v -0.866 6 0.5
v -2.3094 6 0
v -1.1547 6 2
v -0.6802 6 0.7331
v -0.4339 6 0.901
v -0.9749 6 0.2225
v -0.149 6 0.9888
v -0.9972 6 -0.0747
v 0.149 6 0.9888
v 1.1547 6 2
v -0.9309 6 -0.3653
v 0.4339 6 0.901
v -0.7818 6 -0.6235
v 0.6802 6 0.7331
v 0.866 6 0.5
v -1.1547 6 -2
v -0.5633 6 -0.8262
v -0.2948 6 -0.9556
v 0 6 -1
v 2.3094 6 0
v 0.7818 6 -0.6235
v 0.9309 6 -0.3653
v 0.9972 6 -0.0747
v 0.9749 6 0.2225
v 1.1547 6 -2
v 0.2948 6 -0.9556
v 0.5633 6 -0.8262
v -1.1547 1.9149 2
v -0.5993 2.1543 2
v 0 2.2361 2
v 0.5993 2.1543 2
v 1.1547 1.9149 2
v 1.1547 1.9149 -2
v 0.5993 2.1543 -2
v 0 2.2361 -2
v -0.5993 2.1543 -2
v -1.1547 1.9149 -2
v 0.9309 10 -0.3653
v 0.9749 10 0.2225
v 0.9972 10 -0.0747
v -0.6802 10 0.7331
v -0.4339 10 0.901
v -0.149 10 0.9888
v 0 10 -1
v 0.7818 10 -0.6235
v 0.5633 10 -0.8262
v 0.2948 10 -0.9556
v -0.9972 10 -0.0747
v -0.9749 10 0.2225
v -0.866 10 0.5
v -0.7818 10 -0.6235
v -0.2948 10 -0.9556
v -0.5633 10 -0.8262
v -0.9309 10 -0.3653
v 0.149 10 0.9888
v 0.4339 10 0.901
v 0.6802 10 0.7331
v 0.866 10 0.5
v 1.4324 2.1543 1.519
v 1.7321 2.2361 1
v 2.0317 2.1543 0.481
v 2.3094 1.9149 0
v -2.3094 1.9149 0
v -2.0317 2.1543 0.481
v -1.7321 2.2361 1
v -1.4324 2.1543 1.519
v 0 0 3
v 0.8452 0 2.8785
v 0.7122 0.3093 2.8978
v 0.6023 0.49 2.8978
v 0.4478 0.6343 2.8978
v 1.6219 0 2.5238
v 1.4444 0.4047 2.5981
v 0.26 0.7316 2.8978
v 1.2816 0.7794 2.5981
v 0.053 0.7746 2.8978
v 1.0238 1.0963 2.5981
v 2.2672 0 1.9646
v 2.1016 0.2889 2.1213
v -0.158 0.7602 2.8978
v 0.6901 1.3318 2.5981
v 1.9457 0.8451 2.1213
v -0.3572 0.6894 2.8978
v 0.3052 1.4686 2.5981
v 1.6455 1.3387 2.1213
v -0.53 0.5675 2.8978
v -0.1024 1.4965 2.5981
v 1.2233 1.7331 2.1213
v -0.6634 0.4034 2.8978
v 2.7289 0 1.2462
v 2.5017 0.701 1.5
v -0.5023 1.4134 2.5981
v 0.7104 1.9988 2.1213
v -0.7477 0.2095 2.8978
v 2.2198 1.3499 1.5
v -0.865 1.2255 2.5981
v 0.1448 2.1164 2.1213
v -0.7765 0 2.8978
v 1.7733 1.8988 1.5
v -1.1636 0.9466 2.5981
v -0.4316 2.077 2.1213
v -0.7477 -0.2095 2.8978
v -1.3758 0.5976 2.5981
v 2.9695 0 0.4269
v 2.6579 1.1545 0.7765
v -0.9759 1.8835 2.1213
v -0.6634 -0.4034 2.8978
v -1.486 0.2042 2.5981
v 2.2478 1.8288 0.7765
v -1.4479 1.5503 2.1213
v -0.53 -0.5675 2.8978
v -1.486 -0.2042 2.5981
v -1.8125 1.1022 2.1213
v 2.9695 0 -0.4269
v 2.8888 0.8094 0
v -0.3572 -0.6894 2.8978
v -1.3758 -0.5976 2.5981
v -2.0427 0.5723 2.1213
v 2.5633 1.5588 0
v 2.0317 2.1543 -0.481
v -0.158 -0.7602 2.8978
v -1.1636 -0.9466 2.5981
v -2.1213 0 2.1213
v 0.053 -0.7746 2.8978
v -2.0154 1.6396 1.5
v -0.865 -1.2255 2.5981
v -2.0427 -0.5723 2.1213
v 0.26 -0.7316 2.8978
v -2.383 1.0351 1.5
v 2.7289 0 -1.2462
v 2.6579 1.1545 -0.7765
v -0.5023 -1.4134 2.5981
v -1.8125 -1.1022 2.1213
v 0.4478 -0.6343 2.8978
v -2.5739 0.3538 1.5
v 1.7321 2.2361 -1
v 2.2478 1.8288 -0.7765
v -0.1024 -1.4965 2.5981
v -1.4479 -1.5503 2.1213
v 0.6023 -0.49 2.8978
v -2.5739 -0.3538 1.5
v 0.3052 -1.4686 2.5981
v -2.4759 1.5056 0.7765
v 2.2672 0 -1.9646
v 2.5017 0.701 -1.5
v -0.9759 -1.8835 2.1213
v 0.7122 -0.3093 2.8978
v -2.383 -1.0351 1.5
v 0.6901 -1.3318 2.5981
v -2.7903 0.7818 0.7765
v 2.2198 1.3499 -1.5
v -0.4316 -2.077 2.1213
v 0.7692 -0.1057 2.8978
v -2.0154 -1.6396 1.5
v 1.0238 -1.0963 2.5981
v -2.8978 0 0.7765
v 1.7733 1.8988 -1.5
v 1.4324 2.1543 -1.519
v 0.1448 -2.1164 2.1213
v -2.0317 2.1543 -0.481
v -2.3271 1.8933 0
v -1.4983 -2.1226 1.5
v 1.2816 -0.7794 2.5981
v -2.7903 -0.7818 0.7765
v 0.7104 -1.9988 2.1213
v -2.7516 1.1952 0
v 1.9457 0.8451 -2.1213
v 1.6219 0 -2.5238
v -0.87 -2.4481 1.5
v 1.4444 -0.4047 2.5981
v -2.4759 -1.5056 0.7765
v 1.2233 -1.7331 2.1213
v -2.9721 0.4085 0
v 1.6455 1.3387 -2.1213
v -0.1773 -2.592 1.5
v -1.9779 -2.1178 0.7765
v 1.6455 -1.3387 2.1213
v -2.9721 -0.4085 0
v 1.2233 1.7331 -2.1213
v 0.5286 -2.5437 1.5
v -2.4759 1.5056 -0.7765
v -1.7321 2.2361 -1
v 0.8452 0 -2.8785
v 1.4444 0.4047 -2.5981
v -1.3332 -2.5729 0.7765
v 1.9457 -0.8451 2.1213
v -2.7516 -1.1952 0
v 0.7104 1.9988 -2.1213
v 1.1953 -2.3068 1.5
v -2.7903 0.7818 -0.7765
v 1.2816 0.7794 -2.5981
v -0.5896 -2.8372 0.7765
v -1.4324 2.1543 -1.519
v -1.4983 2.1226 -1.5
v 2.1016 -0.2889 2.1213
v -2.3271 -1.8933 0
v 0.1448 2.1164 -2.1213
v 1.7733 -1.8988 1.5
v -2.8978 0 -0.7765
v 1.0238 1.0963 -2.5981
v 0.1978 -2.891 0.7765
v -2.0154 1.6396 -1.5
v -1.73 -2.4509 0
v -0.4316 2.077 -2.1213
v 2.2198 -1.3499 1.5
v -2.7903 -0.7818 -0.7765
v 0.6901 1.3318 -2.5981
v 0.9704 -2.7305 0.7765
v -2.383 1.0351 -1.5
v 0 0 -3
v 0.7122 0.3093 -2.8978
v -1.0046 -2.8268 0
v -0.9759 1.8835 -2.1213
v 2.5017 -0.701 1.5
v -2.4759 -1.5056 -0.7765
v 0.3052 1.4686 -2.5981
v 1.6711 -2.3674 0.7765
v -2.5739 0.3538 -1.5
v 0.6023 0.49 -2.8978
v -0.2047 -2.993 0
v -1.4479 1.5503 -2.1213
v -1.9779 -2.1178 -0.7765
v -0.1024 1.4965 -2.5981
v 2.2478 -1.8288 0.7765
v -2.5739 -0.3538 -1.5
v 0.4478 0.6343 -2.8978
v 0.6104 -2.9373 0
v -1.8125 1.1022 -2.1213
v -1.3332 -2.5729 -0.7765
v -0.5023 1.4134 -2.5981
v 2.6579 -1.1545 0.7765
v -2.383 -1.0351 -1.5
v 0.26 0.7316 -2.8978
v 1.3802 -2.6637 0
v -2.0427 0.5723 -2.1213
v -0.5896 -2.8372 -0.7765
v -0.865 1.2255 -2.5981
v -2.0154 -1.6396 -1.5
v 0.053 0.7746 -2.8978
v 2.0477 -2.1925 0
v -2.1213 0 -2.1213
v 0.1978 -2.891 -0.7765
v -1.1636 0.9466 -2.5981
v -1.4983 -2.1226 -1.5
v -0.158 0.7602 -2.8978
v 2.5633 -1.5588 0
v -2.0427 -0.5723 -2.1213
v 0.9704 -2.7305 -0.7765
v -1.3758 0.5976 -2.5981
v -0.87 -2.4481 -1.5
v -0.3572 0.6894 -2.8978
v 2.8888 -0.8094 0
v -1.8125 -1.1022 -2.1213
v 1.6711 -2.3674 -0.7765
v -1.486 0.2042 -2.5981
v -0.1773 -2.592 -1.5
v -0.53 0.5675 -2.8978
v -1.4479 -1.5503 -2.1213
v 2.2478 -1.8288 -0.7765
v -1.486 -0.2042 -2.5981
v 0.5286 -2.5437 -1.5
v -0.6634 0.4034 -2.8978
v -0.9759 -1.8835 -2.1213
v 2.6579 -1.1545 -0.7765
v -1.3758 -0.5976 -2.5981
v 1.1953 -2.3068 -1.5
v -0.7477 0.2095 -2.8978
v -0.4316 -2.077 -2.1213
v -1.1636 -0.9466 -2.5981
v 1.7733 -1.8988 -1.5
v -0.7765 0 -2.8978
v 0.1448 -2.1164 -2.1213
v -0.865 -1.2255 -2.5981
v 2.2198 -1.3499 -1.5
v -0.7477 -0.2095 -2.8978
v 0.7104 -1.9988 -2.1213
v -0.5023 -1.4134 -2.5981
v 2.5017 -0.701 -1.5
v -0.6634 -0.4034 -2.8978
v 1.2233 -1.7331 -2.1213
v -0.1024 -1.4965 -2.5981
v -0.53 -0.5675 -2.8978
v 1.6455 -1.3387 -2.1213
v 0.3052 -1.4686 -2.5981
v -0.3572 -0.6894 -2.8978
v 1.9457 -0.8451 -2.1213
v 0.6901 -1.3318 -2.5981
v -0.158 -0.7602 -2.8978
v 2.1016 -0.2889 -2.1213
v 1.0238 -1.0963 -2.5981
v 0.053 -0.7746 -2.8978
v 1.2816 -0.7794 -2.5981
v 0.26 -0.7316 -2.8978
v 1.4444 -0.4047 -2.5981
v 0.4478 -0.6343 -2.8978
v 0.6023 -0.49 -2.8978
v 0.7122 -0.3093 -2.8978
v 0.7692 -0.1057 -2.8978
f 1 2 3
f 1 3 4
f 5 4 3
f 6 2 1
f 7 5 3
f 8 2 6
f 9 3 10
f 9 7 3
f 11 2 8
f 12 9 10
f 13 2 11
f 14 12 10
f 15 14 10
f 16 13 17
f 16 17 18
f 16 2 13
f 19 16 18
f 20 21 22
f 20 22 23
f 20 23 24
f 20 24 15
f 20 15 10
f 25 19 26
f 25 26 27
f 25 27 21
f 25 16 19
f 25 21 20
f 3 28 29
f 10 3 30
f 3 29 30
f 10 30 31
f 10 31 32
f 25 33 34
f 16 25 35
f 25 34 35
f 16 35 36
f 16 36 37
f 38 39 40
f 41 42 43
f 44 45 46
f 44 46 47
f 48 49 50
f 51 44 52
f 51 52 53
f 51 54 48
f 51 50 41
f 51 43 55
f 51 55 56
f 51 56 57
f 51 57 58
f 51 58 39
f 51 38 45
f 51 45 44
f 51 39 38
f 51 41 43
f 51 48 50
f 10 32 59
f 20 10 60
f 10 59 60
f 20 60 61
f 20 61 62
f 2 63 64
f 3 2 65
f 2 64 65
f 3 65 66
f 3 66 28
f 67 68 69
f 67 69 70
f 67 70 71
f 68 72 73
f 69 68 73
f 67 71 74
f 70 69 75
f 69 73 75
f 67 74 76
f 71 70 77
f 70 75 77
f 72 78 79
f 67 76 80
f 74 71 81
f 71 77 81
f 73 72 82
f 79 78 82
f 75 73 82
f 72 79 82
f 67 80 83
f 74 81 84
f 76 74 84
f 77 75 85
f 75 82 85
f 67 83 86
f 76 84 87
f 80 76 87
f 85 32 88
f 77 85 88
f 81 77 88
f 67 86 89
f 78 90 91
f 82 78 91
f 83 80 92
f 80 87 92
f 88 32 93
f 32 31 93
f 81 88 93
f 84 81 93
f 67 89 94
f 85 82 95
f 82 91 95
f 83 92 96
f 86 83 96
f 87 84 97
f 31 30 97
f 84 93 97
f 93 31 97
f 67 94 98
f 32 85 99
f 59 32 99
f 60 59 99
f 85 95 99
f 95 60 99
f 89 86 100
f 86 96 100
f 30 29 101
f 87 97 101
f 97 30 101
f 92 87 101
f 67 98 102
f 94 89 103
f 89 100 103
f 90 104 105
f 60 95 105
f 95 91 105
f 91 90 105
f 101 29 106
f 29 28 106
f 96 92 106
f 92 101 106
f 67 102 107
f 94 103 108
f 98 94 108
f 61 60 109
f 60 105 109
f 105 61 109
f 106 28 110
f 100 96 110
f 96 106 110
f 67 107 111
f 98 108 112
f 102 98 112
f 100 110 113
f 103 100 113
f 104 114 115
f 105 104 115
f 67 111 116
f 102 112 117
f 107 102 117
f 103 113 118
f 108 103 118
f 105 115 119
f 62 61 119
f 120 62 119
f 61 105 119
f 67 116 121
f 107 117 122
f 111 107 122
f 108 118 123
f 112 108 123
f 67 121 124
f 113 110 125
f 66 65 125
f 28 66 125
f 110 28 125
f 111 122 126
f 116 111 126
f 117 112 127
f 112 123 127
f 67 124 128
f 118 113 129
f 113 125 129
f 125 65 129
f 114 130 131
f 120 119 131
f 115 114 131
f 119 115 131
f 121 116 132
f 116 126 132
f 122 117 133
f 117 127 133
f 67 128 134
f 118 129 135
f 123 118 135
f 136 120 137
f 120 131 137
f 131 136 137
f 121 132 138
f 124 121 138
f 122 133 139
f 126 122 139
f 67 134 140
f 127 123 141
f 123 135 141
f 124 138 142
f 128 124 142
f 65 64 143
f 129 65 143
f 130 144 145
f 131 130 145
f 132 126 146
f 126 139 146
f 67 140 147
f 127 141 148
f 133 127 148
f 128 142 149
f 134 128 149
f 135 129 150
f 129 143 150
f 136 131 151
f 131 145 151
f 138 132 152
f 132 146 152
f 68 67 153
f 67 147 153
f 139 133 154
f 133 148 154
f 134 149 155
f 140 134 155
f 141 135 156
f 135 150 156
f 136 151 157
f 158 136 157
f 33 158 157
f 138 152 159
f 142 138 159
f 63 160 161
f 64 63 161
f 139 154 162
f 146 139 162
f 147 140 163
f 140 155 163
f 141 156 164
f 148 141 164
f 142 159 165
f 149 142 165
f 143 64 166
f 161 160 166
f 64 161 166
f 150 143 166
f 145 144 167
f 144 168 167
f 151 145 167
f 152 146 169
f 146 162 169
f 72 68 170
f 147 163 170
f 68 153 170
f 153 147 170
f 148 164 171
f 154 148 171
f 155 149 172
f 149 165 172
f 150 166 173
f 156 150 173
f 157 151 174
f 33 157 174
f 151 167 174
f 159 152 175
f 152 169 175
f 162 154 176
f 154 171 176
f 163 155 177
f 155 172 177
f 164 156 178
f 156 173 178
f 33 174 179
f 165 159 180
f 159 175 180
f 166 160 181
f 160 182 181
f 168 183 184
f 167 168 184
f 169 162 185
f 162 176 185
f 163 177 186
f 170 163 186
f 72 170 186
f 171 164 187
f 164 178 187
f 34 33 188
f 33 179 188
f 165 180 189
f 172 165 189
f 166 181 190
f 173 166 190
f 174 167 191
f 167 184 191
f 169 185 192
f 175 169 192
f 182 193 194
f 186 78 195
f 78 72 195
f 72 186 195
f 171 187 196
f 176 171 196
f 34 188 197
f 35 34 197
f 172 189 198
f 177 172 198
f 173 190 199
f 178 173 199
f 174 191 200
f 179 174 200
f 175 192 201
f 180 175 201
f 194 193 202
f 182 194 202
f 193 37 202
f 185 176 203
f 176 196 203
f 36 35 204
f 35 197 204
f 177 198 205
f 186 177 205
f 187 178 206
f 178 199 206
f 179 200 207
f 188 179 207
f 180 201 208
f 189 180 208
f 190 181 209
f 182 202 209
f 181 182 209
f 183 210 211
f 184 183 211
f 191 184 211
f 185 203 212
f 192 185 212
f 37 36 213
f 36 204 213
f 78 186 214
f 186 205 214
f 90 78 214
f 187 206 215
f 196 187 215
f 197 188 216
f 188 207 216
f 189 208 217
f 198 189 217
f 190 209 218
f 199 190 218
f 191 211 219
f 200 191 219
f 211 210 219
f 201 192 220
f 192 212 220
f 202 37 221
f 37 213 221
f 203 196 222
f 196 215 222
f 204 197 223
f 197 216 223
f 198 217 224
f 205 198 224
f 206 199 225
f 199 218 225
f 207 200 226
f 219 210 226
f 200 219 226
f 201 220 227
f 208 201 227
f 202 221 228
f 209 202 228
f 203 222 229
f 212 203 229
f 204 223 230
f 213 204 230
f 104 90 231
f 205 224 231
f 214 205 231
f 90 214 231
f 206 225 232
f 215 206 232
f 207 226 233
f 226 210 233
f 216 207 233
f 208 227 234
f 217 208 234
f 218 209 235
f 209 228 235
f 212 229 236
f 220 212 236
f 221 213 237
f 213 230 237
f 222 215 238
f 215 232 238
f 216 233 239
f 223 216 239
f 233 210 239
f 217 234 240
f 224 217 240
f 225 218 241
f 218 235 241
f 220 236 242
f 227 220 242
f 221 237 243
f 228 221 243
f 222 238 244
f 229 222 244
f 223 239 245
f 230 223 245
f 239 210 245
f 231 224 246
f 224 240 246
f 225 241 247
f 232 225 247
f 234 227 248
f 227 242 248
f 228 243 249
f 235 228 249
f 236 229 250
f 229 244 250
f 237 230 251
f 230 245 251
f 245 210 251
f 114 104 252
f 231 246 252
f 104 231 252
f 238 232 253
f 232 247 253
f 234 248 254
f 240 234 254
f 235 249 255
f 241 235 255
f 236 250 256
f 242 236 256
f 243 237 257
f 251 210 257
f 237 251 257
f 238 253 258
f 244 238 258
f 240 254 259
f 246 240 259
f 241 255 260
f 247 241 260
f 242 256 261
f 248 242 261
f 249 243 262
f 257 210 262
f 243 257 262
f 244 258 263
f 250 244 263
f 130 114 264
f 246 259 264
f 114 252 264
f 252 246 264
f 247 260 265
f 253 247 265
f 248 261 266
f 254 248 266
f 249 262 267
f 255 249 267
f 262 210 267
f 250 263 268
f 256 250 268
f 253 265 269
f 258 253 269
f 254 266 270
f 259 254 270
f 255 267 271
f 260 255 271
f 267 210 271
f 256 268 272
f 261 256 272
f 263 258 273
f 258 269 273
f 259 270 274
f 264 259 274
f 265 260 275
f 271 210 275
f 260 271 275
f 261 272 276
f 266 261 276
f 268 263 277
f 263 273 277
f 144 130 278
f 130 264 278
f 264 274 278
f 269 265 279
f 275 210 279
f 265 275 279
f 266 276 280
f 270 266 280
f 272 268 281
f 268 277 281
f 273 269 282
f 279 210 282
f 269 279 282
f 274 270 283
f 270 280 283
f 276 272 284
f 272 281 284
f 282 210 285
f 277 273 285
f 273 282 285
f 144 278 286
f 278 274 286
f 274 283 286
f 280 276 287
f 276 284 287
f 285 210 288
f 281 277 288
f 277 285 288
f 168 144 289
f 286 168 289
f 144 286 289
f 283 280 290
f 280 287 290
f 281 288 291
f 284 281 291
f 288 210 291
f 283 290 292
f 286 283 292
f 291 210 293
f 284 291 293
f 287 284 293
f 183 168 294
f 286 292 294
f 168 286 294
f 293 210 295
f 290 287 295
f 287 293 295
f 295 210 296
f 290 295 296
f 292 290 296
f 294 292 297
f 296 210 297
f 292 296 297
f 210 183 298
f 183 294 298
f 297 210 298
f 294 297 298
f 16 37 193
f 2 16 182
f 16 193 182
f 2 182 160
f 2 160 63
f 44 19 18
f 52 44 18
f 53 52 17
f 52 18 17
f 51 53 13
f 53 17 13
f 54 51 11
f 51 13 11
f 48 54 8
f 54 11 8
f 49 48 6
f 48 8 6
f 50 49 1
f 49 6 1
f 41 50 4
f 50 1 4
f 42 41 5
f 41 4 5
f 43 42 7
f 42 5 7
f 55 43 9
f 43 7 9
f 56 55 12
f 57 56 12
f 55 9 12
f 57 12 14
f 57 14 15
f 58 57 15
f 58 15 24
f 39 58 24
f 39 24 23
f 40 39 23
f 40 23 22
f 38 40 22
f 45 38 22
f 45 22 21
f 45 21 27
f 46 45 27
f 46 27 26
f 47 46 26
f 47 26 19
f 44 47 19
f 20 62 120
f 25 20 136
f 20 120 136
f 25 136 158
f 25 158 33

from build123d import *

# Parameters (mm, degrees)
SKETCH_2_R      = 1
EXTRUDE_1_DEPTH = 10
EXTRUDE_2_DEPTH = 6


with BuildPart() as part:
    # 草图1 → 旋转1 (revolve)
    with BuildSketch(Plane(origin=(0, 0, 0), x_dir=(1, 0, 0), z_dir=(0, 1, 0))):
        with BuildLine():
            Line((0, 3), (0, -3))
            ThreePointArc((0, -3), (3, 0), (0, 3))
        make_face()
    revolve(axis=Axis((0, 0, -3), (0, 0, 1)))

    # 草图2 → 凸台-拉伸1 (add)
    with BuildSketch(Plane(origin=(0, 0, 0), x_dir=(1, 0, 0), z_dir=(0, 1, 0))):
        with Locations(Location((0, 0, 0), (0, 0, 90))):
            Circle(SKETCH_2_R)
    extrude(amount=EXTRUDE_1_DEPTH)

    # 草图3 → 凸台-拉伸2 (add)
    with BuildSketch(Plane(origin=(0, 0, 0), x_dir=(1, 0, 0), z_dir=(0, 1, 0))):
        Polygon((2.309401077, 0), (1.154700538, 2), (-1.154700538, 2), (-2.309401077, 0), (-1.154700538, -2), (1.154700538, -2), align=None)
    extrude(amount=EXTRUDE_2_DEPTH)


solid = part.part
